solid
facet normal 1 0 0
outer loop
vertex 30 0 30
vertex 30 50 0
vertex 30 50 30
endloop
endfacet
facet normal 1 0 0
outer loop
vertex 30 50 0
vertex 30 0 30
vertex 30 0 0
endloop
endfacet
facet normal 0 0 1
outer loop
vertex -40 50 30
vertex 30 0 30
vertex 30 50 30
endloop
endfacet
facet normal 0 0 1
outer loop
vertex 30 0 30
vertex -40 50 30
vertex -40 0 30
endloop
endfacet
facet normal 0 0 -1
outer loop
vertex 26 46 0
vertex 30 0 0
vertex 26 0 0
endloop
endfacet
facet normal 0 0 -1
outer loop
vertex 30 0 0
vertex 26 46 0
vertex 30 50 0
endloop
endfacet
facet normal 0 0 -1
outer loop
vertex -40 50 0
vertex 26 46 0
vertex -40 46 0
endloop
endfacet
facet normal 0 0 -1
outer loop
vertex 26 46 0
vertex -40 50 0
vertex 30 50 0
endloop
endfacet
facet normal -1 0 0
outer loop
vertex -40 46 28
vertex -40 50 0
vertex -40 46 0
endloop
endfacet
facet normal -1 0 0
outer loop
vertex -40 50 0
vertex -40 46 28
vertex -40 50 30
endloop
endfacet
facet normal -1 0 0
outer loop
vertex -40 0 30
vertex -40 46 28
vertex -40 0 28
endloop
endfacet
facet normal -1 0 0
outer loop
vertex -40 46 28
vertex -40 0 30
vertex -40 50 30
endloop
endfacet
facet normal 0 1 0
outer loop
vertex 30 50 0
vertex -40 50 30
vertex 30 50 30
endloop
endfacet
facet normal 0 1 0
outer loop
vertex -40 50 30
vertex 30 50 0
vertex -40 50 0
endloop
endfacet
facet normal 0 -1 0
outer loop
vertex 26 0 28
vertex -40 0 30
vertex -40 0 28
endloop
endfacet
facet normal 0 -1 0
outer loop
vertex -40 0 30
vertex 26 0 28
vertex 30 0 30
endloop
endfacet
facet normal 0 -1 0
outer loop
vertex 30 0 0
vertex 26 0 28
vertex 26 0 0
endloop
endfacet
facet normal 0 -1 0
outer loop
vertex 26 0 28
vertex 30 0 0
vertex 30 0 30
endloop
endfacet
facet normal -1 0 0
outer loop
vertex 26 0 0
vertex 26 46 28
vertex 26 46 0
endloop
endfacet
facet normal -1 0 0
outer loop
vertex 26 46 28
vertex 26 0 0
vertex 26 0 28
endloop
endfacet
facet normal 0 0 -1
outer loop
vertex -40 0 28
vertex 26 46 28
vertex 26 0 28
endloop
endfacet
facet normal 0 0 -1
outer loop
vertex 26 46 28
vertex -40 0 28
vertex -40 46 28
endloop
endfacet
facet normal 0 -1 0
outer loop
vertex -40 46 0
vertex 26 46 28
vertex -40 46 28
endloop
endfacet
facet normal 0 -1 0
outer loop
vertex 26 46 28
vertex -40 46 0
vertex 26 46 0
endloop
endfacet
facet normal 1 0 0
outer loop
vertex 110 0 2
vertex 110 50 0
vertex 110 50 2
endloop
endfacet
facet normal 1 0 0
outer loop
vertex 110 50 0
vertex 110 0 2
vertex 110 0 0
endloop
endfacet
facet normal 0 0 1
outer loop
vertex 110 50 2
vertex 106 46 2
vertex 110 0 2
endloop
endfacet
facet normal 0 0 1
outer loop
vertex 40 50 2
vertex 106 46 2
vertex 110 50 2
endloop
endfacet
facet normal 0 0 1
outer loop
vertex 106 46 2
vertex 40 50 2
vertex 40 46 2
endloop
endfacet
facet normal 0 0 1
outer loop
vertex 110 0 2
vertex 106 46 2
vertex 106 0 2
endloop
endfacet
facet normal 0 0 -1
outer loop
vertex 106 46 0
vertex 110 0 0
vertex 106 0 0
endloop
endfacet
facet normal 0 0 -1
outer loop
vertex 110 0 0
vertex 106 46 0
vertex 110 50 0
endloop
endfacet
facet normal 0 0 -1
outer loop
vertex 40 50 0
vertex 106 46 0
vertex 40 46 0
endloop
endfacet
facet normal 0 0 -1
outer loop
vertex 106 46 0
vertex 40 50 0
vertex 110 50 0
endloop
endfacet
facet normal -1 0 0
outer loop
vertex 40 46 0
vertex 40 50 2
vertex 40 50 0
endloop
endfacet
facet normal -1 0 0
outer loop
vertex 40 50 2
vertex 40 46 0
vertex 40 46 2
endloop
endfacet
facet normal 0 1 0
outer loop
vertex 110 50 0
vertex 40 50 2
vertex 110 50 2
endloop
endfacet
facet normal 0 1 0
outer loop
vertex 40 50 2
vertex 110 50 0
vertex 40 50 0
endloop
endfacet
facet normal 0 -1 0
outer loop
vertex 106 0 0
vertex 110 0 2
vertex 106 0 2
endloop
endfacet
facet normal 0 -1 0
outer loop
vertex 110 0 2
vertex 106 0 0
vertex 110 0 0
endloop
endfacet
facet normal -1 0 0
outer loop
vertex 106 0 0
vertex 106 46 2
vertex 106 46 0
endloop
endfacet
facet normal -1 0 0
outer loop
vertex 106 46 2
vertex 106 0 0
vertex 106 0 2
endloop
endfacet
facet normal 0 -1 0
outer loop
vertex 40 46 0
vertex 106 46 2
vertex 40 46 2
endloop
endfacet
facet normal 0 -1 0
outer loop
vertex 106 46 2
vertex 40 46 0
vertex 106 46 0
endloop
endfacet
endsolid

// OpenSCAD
// Two-part enclosure for small electronics board
// Part 1: Box (left)
// Part 2: Lid (right, printed upside down)
// Prints together with a 10 mm gap between them.

// --- Dimensions ---
// Box Outer Dimensions (X x Y x Z)
$box_outer_x = 70;
$box_outer_y = 50;
$box_outer_z = 30;

// Wall and Floor Thickness
$wall_thickness = 2;
$floor_thickness = 2;

// Lid Dimensions
// Plate thickness
$plate_thickness = 2;
// Lip dimensions
$lip_thickness = 1.5;
$lip_height = 4;
// Lip outer size (fits inside box opening)
$lip_outer_x = 65.6;
$lip_outer_y = 45.6;

// Clearance
$clearance = 0.2;

// Gap between parts
$gap = 10;

// --- Configuration ---
$fn = 64; // Smooth curves

// --- Part 1: The Box ---
// Position: Centered in Y, starts at X = -($box_outer_x/2 + $gap/2)
// Rests on Z=0
translate([ -($box_outer_x/2 + $gap/2), 0, 0 ])
difference() {
    // Outer block
    cube([ $box_outer_x, $box_outer_y, $box_outer_z ]);
    
    // Cut out the inside (open top)
    // Inner dimensions:
    // X: outer_x - 2*wall
    // Y: outer_y - 2*wall
    // Z: outer_z - floor (cut all the way to the bottom of the box walls)
    inner_x = $box_outer_x - (2 * $wall_thickness);
    inner_y = $box_outer_y - (2 * $wall_thickness);
    inner_z = $box_outer_z - $floor_thickness;
    
    // Extend cut slightly past the bottom face to ensure no thin walls remain at the very bottom edge
    translate([0, 0, -0.1]) 
    cube([ inner_x, inner_y, inner_z + 0.1 ]);
}

// --- Part 2: The Lid ---
// Position: Centered in Y, starts at X = +($box_outer_x/2 + $gap/2)
// Rests on Z=0 (printed upside down as requested)
// The lid geometry is modeled with the plate at Z=0 and the lip extending upwards.
translate([ $box_outer_x/2 + $gap/2, 0, 0 ])
difference() {
    // Base Plate
    cube([ $box_outer_x, $box_outer_y, $plate_thickness ]);
    
    // Cut out the hole for the lip
    // The lip outer size is $lip_outer_x by $lip_outer_y.
    // We need to cut a hole slightly larger than the lip outer size to allow it to slide in.
    // Clearance on each side is 0.2mm.
    // Hole X = lip_outer_x + 2*clearance
    // Hole Y = lip_outer_y + 2*clearance
    hole_x = $lip_outer_x + (2 * $clearance);
    hole_y = $lip_outer_y + (2 * $clearance);
    
    // Depth = lip_height + lip_thickness (to remove the material the lip will sit on)
    // We extend the cut slightly past the top of the lip to ensure clean separation.
    hole_depth = $lip_height + $lip_thickness + 0.1;
    
    // The cut starts from the bottom of the plate (Z=0) and goes up through the plate and the lip.
    cube([ hole_x, hole_y, hole_depth ]);
}
